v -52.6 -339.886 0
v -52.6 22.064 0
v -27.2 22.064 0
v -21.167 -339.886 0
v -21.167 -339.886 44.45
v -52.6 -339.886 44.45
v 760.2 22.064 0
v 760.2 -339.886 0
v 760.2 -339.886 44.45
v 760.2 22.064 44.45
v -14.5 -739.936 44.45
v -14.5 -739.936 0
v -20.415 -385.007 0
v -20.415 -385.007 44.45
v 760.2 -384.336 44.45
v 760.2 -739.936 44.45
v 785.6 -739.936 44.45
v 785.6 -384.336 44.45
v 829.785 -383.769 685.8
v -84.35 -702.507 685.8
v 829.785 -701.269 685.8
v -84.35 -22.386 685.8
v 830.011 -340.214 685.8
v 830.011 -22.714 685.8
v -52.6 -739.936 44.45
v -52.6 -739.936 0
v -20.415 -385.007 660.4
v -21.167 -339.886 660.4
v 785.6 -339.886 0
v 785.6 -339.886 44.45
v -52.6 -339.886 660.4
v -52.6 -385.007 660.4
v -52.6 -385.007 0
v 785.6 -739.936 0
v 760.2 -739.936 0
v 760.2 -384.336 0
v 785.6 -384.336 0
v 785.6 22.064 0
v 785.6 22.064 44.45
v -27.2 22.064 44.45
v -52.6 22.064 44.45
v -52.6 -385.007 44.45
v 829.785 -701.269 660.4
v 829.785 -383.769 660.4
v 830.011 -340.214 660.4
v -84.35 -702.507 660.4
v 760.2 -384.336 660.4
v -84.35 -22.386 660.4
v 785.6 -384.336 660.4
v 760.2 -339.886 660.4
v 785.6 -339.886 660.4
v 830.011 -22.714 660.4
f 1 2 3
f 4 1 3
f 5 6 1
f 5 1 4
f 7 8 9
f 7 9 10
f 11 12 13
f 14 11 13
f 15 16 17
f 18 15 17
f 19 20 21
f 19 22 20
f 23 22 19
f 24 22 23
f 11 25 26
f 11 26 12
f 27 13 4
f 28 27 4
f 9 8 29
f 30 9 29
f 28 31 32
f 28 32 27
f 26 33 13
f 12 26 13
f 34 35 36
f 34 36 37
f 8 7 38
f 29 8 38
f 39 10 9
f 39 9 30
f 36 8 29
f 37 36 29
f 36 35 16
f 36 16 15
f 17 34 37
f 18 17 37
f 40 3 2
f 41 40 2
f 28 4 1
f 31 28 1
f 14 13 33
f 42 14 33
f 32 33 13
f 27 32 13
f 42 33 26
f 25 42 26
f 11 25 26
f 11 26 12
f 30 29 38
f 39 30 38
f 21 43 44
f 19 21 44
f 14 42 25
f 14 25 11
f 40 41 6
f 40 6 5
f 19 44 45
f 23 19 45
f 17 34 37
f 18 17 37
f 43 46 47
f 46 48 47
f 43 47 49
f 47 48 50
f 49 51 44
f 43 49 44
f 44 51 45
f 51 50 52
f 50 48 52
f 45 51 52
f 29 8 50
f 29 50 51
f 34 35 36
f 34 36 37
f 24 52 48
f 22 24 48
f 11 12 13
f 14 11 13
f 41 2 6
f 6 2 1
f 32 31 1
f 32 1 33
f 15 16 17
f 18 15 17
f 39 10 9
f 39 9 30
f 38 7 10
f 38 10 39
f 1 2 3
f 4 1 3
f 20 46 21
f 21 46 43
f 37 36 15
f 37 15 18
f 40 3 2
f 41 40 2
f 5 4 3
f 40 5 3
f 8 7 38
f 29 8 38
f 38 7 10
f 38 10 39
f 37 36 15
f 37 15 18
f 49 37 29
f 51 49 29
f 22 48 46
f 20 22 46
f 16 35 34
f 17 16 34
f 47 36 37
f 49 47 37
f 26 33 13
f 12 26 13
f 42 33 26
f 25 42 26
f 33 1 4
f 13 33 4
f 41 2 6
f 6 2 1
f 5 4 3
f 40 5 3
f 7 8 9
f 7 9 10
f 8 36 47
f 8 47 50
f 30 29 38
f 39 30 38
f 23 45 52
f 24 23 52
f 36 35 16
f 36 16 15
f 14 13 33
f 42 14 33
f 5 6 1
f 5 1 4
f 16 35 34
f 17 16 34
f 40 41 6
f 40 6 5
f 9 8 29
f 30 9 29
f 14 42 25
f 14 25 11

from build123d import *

# Parameters (mm, degrees)
F1_DEPTH = 44.45
F0_W     = 25.4
F0_H     = 355.6
F0_H_2   = 361.95
F2_DEPTH = 660.4
F0_H_3   = 44.45
F3_DEPTH = 44.45
F5_DEPTH = 25.4


with BuildPart() as f1:
    # F0 (on Top) → F1 (new body)
    with BuildSketch(Plane.XY):
        Polygon((-20.4151007465, -385.0066614151), (-52.5996065524, -385.0066614151), (-52.5996065524, -739.9363130581), (-14.4996065524, -739.9363130581), align=None)
    extrude(amount=F1_DEPTH)


with BuildPart() as f1b:
    # F0 (on Top) → F1, piece 2 (new body)
    with BuildSketch(Plane.XY):
        with Locations((772.9003934476, -562.1363130581)):
            Rectangle(F0_W, F0_H)
    extrude(amount=F1_DEPTH)


with BuildPart() as f1c:
    # F0 (on Top) → F1, piece 3 (new body)
    with BuildSketch(Plane.XY):
        with Locations((772.9003934476, -158.9113130581)):
            Rectangle(F0_W, F0_H_2)
    extrude(amount=F1_DEPTH)


with BuildPart() as f1d:
    # F0 (on Top) → F1, piece 4 (new body)
    with BuildSketch(Plane.XY):
        Polygon((-27.1996065524, 22.0636869419), (-52.5996065524, 22.0636869419), (-52.5996065524, -339.8863130581), (-21.1671065524, -339.8863130581), align=None)
    extrude(amount=F1_DEPTH)


with BuildPart() as f2:
    # F0 (on Top) → F2 (new body)
    with BuildSketch(Plane.XY):
        Polygon((-21.1671065524, -339.8863130581), (-52.5996065524, -339.8863130581), (-52.5996065524, -385.0066614151), (-20.4151007465, -385.0066614151), align=None)
    extrude(amount=F2_DEPTH)


with BuildPart() as f2b:
    # F0 (on Top) → F2, piece 2 (new body)
    with BuildSketch(Plane.XY):
        with Locations((772.9003934476, -362.1113130581)):
            Rectangle(F0_W, F0_H_3)
    extrude(amount=F2_DEPTH)

    # F4 (on face) → F5 (join)
    with BuildSketch(Plane.XY.offset(660.4)):
        Polygon((-84.3496065524, -339.8863130581), (-84.3496065524, -385.0066614151), (-84.3496065524, -702.5066614151), (829.7848851204, -701.2691247463), (829.7848851204, -383.7691247463), (830.0107271194, -340.2135372162), (830.0107271194, -22.7135372162), (-84.3496065524, -22.3863130581), align=None)
        Polygon((-20.4151007465, -385.0066614151), (-52.5996065524, -385.0066614151), (-52.5996065524, -339.8863130581), (-21.1671065524, -339.8863130581), align=None, mode=Mode.SUBTRACT)
        Polygon((-52.5996065524, -339.8863130581), (-52.5996065524, -385.0066614151), (-20.4151007465, -385.0066614151), (-21.1671065524, -339.8863130581), align=None)
    extrude(amount=F5_DEPTH)


with BuildPart() as f3:
    # F0 (on Top) → F3 (new body)
    with BuildSketch(Plane.XY):
        Polygon((-27.1996065524, 22.0636869419), (-52.5996065524, 22.0636869419), (-52.5996065524, -339.8863130581), (-21.1671065524, -339.8863130581), align=None)
    extrude(amount=F3_DEPTH)


with BuildPart() as f3b:
    # F0 (on Top) → F3, piece 2 (new body)
    with BuildSketch(Plane.XY):
        Polygon((-20.4151007465, -385.0066614151), (-52.5996065524, -385.0066614151), (-52.5996065524, -739.9363130581), (-14.4996065524, -739.9363130581), align=None)
    extrude(amount=F3_DEPTH)


with BuildPart() as f3c:
    # F0 (on Top) → F3, piece 3 (new body)
    with BuildSketch(Plane.XY):
        with Locations((772.9003934476, -158.9113130581)):
            Rectangle(F0_W, F0_H_2)
    extrude(amount=F3_DEPTH)


with BuildPart() as f3d:
    # F0 (on Top) → F3, piece 4 (new body)
    with BuildSketch(Plane.XY):
        with Locations((772.9003934476, -562.1363130581)):
            Rectangle(F0_W, F0_H)
    extrude(amount=F3_DEPTH)


solid = Compound([f1.part, f1b.part, f1c.part, f1d.part, f2.part, f2b.part, f3.part, f3b.part, f3c.part, f3d.part])
